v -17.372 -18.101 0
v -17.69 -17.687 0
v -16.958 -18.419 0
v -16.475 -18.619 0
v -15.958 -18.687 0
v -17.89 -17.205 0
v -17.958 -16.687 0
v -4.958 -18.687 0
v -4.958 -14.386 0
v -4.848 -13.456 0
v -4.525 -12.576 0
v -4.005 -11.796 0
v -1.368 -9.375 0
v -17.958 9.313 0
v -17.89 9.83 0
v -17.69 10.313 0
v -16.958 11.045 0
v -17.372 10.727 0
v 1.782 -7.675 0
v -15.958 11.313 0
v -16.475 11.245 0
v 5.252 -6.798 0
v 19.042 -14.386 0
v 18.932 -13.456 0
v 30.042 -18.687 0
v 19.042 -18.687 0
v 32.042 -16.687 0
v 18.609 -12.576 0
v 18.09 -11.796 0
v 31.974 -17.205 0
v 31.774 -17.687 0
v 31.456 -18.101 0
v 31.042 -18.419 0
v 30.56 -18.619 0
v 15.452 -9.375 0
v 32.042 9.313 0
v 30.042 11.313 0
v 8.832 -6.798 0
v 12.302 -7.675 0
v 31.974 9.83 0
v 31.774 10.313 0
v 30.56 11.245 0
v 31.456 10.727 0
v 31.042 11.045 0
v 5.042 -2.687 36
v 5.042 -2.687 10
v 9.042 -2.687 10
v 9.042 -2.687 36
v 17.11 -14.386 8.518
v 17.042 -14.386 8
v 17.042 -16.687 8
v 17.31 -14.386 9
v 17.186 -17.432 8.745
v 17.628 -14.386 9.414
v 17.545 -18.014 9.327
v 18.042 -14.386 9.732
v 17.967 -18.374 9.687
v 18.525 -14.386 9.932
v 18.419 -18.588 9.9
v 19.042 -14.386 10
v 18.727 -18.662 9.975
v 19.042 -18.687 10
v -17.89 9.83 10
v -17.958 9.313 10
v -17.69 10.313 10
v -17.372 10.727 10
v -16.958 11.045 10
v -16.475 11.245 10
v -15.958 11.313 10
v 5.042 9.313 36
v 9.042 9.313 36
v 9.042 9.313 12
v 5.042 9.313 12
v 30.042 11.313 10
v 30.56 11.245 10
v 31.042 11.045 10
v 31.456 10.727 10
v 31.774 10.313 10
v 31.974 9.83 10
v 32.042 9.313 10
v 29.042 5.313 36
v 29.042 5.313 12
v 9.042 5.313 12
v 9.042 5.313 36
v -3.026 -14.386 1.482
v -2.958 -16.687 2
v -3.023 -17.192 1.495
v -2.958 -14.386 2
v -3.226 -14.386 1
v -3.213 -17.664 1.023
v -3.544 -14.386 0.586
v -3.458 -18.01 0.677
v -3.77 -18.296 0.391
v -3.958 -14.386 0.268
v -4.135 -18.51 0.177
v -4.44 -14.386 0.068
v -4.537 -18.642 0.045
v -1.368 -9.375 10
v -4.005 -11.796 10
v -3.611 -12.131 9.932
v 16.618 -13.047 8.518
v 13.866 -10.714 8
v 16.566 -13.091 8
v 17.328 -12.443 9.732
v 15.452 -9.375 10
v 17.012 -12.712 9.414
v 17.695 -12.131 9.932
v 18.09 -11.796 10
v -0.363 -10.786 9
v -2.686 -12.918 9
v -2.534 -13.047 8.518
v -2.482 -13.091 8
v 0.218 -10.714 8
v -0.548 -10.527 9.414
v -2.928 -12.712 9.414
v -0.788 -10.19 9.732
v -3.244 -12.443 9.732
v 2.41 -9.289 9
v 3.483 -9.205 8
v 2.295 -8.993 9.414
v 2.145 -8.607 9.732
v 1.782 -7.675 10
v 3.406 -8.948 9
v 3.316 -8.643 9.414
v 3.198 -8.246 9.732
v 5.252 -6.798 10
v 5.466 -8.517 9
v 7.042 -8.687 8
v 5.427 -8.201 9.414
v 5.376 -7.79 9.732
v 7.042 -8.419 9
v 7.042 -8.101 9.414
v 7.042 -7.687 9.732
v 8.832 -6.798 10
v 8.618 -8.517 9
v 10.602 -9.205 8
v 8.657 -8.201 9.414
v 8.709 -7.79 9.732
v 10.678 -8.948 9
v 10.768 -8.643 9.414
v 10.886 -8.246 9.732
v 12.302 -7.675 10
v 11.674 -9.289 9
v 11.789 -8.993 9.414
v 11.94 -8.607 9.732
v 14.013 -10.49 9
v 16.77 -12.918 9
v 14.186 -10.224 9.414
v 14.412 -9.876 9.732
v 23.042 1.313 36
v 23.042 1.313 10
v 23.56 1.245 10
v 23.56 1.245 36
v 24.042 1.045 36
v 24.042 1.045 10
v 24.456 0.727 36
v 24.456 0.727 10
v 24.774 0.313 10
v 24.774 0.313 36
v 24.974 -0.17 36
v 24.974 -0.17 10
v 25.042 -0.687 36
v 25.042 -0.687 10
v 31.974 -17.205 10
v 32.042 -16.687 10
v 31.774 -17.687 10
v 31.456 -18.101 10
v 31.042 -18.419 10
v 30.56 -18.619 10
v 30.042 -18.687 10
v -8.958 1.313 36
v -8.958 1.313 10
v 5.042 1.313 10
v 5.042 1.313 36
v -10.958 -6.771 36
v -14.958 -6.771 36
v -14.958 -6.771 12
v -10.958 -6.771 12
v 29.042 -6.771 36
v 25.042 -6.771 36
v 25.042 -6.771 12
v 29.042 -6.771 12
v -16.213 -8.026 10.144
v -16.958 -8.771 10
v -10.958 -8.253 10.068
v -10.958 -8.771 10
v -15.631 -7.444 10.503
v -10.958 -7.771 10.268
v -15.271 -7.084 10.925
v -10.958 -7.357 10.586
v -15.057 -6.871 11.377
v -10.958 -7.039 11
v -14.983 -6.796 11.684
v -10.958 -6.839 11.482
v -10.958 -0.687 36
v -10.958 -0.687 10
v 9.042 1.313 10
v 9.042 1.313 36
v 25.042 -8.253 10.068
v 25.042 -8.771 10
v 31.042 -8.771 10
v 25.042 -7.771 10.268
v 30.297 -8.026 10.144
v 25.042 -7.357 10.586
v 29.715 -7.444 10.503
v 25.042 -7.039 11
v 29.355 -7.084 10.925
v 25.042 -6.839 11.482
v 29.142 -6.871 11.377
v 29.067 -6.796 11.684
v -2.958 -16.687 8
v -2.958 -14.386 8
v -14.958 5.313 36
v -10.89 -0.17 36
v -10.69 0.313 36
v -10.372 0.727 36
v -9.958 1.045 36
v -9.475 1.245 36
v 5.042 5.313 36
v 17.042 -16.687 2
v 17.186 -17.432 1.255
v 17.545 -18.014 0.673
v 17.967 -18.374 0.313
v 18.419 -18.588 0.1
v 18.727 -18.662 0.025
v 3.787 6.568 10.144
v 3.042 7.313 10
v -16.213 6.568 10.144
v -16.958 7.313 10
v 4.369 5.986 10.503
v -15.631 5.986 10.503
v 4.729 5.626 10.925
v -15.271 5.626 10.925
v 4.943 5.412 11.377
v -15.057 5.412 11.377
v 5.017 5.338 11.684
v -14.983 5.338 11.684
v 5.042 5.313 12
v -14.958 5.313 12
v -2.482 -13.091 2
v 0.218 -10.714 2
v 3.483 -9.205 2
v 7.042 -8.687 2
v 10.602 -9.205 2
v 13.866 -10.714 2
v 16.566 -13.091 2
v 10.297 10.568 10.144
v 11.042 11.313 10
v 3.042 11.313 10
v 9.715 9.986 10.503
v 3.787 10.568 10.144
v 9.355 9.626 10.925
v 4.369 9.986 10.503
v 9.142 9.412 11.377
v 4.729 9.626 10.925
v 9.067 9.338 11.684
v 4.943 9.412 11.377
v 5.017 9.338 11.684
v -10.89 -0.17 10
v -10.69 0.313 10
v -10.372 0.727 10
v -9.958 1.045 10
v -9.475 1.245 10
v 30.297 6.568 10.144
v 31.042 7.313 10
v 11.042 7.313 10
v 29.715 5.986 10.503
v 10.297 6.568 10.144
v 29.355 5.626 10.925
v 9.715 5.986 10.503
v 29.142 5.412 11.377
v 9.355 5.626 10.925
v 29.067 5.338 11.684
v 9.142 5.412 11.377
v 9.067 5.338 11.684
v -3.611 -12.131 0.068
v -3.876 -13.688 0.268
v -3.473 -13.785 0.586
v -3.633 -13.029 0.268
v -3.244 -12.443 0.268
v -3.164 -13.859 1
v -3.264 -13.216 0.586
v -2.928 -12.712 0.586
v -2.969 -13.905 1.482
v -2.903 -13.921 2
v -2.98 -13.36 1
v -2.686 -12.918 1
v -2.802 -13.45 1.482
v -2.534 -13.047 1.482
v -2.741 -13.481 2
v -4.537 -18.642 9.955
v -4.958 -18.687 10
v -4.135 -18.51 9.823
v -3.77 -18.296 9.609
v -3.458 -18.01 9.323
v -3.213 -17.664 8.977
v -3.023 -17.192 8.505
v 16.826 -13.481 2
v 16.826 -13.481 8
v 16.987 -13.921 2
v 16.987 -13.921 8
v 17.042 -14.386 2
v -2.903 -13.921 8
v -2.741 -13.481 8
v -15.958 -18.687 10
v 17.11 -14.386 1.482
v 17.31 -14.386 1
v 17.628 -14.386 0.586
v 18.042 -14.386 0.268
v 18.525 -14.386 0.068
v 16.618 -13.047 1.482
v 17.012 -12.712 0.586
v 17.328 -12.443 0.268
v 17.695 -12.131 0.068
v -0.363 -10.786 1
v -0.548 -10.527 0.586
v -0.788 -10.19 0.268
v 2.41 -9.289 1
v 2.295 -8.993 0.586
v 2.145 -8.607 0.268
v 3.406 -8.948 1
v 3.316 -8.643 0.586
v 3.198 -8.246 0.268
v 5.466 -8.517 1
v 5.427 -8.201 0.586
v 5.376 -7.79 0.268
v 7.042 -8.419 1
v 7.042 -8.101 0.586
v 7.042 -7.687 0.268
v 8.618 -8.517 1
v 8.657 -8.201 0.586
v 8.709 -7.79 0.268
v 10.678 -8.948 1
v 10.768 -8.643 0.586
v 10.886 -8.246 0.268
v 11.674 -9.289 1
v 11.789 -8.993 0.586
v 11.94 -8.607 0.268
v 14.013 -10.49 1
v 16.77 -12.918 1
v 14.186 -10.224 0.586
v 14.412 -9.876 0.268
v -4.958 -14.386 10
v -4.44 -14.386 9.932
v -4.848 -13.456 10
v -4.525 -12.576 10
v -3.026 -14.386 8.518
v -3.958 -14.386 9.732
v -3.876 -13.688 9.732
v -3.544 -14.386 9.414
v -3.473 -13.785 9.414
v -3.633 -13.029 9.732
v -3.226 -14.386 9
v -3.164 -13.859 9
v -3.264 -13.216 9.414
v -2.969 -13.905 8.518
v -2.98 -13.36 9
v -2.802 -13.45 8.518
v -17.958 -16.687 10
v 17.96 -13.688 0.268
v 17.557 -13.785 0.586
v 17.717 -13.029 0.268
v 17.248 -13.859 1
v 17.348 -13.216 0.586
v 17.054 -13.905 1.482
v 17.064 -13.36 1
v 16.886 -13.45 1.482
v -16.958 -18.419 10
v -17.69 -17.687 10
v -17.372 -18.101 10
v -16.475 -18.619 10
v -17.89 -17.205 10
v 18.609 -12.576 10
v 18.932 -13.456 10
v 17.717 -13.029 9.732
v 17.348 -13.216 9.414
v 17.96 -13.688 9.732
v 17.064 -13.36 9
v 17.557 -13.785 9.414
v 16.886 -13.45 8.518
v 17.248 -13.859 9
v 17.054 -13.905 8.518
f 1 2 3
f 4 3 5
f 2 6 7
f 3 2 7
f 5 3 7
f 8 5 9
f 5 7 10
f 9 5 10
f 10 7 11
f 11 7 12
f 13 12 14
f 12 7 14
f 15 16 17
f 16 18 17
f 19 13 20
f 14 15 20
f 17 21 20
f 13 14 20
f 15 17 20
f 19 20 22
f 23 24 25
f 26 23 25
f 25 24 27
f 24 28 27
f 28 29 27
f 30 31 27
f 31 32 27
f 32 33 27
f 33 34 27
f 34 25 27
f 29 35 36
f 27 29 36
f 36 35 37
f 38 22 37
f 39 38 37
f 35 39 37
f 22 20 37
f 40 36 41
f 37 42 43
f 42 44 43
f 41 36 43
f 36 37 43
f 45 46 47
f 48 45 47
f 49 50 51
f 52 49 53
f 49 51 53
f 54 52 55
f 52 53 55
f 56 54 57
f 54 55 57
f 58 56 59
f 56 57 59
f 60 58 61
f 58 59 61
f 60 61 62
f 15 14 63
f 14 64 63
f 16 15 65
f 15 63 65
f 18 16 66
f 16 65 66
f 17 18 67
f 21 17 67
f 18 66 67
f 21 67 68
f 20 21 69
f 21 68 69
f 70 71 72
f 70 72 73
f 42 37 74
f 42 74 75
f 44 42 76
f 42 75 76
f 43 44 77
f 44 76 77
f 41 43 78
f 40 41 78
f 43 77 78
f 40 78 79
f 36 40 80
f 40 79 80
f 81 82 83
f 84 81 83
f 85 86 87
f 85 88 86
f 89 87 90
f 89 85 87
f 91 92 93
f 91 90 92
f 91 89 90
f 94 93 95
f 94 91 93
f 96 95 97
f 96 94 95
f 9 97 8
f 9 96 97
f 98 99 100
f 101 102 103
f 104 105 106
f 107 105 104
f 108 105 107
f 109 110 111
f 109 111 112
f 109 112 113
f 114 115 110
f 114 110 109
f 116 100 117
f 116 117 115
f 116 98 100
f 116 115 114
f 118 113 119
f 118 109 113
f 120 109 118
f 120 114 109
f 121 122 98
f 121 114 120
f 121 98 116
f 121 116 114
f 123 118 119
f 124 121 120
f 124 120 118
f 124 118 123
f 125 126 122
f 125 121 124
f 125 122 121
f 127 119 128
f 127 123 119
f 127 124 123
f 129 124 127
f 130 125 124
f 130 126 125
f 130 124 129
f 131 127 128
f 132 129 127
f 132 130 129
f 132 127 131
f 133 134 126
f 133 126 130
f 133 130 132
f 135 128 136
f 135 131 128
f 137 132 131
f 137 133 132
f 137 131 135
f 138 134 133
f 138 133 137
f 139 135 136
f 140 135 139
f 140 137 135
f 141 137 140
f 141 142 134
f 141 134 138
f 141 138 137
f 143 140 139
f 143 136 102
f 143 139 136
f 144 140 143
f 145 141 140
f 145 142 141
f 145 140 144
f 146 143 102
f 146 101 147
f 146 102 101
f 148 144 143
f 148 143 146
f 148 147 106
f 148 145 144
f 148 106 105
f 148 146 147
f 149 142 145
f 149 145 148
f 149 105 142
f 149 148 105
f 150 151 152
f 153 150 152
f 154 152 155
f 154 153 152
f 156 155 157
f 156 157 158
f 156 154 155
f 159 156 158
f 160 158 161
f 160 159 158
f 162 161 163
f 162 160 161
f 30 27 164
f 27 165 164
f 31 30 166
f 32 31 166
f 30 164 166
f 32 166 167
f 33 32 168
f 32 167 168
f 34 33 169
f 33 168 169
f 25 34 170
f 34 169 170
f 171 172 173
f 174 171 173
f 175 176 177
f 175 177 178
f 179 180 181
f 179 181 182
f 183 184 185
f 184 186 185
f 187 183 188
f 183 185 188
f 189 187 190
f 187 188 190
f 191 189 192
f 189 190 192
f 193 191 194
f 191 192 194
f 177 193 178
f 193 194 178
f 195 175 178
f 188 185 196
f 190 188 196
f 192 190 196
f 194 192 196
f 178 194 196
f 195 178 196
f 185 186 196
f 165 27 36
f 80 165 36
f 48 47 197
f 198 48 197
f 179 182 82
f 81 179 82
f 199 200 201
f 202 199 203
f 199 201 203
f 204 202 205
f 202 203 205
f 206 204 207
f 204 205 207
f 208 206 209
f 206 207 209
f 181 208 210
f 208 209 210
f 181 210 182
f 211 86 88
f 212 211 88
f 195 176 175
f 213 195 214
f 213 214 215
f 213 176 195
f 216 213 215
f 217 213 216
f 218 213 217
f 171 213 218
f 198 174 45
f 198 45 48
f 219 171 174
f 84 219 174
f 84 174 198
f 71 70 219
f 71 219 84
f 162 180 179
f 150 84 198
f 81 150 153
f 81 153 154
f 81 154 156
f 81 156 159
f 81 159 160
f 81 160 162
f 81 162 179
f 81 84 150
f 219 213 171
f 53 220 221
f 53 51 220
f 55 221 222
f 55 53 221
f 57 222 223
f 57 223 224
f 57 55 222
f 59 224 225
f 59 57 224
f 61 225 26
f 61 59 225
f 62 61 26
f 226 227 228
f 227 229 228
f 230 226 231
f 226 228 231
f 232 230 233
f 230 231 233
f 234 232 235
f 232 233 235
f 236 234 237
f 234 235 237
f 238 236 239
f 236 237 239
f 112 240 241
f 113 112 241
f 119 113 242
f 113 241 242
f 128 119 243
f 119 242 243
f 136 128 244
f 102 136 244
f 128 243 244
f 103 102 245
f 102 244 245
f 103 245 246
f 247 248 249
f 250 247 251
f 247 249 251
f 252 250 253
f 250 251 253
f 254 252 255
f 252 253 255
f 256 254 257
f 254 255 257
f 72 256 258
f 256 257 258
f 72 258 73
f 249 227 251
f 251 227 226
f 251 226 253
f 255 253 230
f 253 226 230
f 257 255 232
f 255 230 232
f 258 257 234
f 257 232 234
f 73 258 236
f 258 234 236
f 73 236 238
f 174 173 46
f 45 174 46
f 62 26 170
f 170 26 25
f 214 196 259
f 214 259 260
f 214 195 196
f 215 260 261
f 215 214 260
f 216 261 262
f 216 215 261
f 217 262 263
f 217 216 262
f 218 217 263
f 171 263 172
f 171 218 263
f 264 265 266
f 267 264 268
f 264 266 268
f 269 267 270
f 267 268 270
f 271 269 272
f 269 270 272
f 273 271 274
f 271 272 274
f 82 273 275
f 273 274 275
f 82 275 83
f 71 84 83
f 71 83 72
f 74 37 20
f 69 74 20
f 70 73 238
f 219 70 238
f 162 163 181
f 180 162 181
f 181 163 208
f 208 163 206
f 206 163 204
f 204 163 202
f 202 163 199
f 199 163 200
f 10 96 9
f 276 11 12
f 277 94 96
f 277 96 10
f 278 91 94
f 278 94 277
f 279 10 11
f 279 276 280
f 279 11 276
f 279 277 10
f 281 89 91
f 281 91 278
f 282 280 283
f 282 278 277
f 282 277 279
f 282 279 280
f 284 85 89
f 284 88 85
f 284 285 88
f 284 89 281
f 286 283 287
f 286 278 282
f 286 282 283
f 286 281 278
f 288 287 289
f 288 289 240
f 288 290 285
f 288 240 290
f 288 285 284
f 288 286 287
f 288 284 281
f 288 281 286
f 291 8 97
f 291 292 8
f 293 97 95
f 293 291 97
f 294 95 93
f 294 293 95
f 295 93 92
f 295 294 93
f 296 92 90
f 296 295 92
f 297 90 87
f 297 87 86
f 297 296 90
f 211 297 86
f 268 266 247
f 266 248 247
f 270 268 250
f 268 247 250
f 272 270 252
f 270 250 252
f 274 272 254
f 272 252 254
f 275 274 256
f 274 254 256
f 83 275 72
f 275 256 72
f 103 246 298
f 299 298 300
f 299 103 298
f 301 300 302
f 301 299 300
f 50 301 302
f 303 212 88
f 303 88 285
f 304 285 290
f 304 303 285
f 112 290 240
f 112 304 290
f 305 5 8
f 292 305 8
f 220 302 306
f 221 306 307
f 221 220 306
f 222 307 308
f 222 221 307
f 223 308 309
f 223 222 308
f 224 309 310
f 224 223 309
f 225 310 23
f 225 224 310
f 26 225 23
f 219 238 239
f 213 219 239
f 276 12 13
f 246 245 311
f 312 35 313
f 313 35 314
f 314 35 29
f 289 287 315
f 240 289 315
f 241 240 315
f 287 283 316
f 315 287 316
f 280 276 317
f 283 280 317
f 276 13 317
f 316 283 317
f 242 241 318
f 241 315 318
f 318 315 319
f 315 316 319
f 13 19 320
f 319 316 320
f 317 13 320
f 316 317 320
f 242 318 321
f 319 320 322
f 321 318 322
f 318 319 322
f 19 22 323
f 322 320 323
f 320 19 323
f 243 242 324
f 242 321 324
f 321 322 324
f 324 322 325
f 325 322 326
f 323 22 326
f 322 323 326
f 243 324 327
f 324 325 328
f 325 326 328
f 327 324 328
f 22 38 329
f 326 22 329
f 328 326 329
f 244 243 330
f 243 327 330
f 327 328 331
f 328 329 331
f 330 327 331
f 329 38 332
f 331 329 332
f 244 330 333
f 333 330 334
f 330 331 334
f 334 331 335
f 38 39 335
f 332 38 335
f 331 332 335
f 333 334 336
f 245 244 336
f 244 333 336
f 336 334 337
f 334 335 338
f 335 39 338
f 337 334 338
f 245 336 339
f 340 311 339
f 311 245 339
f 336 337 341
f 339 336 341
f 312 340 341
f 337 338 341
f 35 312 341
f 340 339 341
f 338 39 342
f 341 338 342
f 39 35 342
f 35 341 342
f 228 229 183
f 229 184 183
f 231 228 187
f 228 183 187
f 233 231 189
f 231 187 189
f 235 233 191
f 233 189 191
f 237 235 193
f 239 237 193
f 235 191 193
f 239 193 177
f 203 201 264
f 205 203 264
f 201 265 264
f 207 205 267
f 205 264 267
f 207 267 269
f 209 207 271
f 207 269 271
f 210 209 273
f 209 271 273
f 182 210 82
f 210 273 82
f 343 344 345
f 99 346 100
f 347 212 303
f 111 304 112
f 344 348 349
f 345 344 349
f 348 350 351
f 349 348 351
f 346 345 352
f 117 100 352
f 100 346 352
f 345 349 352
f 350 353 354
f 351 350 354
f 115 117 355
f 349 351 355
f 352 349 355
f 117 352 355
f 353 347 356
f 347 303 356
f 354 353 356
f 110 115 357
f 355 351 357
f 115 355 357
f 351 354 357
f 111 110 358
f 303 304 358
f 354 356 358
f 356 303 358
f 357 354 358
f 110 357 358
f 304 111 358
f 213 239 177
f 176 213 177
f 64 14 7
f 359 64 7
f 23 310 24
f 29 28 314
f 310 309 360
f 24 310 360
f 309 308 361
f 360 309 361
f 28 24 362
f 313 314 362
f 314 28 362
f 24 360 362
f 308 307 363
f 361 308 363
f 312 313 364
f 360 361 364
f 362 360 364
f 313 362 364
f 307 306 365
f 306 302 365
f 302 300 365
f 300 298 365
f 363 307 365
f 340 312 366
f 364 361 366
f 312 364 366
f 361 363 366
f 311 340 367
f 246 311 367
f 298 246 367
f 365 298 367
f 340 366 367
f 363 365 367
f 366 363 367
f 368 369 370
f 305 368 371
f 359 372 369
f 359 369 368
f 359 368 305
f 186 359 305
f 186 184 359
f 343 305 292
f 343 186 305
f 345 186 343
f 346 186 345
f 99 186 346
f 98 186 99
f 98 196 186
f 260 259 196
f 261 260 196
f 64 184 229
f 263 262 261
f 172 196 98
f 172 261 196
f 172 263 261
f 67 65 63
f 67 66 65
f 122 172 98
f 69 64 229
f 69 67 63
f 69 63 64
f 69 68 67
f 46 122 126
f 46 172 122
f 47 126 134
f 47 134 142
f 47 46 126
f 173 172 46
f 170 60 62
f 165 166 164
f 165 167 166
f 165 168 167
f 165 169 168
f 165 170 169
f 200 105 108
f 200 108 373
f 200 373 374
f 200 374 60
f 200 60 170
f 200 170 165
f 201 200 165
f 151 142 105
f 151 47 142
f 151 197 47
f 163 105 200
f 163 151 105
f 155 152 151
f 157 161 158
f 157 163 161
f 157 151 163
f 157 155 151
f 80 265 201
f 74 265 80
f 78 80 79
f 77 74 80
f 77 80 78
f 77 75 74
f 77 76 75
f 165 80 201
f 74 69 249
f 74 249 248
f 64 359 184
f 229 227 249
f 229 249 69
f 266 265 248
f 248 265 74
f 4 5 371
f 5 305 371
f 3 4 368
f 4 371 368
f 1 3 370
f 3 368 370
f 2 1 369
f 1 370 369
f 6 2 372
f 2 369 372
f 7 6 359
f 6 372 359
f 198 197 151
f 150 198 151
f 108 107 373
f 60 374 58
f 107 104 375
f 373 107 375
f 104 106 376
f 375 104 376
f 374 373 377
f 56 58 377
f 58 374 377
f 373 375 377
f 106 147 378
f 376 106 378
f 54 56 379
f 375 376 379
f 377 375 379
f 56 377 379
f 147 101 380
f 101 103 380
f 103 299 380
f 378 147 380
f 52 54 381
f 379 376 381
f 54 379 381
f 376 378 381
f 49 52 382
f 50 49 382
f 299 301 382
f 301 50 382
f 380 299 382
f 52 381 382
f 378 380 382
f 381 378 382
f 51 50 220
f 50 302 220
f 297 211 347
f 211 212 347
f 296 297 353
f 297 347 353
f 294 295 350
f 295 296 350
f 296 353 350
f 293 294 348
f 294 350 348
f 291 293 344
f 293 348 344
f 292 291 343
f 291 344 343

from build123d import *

# Parameters (mm, degrees)
RESSALTO_EXTRUS_O1_DEPTH = 10
FILETE1_R                = 2
FILETE2_R                = 2
RESSALTO_EXTRUS_O2_DEPTH = 26
FILETE4_R                = 2
FILETE6_R                = 2


with BuildPart() as part:
    # Esboço1 → Ressalto-extrusão1 (new body)
    with BuildSketch(Plane.XY):
        Polygon((-17.957860615883305, -18.6871961102107), (-2.9578606158833054, -18.687196110210696), (-2.957860615883306, -13.687196110210696), (-2.957860615883306, -8.687196110210698), (7.042139384116819, -8.687196110210696), (7.042139384116693, 11.312803889789302), (-17.95786061588331, 11.312803889789302), align=None)
        with BuildLine():
            Line((-2.957860615883306, -8.687196110210698), (-2.957860615883306, -13.687196110210696))
            ThreePointArc((-2.9578606158833054, -13.687196110210696), (1.451969440367277, -10.006856222711722), (7.042139384116818, -8.6871961102107))
            Line((7.042139384116819, -8.687196110210696), (-2.957860615883306, -8.687196110210698))
        make_face()
        Polygon((7.042139384116693, 11.312803889789302), (7.0421393841166955, -8.687196110210698), (17.042139384116695, -8.687196110210696), (17.042139384116698, -13.687196110210698), (17.042139384116698, -18.687196110210696), (32.042139384116695, -18.687196110210692), (32.042139384116695, 11.31280388978931), align=None)
        with BuildLine():
            Line((17.042139384116695, -8.687196110210696), (7.042139384116819, -8.687196110210696))
            ThreePointArc((7.042139384116818, -8.6871961102107), (12.632309327866226, -10.006856222711777), (17.0421393841167, -13.687196110210698))
            Line((17.042139384116698, -13.687196110210698), (17.042139384116695, -8.687196110210696))
        make_face()
    extrude(amount=RESSALTO_EXTRUS_O1_DEPTH)

    # Filete1
    filete1_edges = [part.edges().sort_by_distance(p)[0] for p in [
        (17.042139384116695, -16.187196110210696, 10),
        (17.042139384116695, -16.187196110210696, 0),
        (7.042139384116695, -8.6871961102107, 0),
        (-2.9578606158833054, -13.687196110210696, 5),
        (-2.9578606158833054, -18.6871961102107, 5),
        (17.042139384116695, -18.687196110210696, 5),
        (17.0421393841167, -13.687196110210698, 5),
        (-2.9578606158833054, -16.1871961102107, 10),
        (7.042139384116694, -8.6871961102107, 10),
        (-2.9578606158833054, -16.1871961102107, 0),
    ]]
    fillet(filete1_edges, radius=FILETE1_R)

    # Filete2
    filete2_edges = [part.edges().sort_by_distance(p)[0] for p in [
        (-17.957860615883305, -18.6871961102107, 5),
        (-17.95786061588331, 11.312803889789302, 5),
        (32.042139384116695, 11.31280388978931, 5),
        (32.042139384116695, -18.687196110210692, 5),
    ]]
    fillet(filete2_edges, radius=FILETE2_R)

    # Esboço2 → Ressalto-extrusão2 (add)
    with BuildSketch(Plane.XY.offset(10)):
        Polygon((9.042139384116691, 9.312803889789297), (5.042139384116695, 9.312803889789297), (5.042139384116695, 5.312803889789297), (-14.957860615883307, 5.312803889789293), (-14.957860615883302, -6.771146492865117), (-10.957860615883302, -6.771146492865116), (-10.957860615883309, 1.312803889789298), (5.042139384116695, 1.3128038897893), (5.042139384116695, -2.6871961102106985), (9.042139384116695, -2.687196110210697), (9.042139384116693, 1.3128038897892964), (25.04213938411669, 1.3128038897893024), (25.042139384116695, -6.771146492865112), (29.042139384116695, -6.771146492865111), (29.042139384116695, 5.312803889789296), (9.042139384116693, 5.312803889789297), align=None)
    extrude(amount=RESSALTO_EXTRUS_O2_DEPTH)

    # Filete4
    filete4_edges = [part.edges().sort_by_distance(p)[0] for p in [
        (-10.957860615883309, 1.312803889789298, 23),
        (25.042139384116695, 1.3128038897893024, 23),
    ]]
    fillet(filete4_edges, radius=FILETE4_R)

    # Filete6
    filete6_edges = [part.edges().sort_by_distance(p)[0] for p in [
        (-14.957860615883305, -0.729171301537912, 10),
        (27.042139384116695, -6.771146492865111, 10),
        (29.042139384116695, -0.7291713015379075, 10),
        (7.042139384116693, 9.312803889789297, 10),
        (5.042139384116695, 7.312803889789297, 10),
        (-4.957860615883305, 5.312803889789295, 10),
        (9.042139384116691, 7.312803889789297, 10),
        (19.042139384116695, 5.312803889789297, 10),
        (-12.957860615883302, -6.771146492865116, 10),
    ]]
    fillet(filete6_edges, radius=FILETE6_R - 0.0001)  # a hair under: the kernel refuses the full size


solid = part.part
